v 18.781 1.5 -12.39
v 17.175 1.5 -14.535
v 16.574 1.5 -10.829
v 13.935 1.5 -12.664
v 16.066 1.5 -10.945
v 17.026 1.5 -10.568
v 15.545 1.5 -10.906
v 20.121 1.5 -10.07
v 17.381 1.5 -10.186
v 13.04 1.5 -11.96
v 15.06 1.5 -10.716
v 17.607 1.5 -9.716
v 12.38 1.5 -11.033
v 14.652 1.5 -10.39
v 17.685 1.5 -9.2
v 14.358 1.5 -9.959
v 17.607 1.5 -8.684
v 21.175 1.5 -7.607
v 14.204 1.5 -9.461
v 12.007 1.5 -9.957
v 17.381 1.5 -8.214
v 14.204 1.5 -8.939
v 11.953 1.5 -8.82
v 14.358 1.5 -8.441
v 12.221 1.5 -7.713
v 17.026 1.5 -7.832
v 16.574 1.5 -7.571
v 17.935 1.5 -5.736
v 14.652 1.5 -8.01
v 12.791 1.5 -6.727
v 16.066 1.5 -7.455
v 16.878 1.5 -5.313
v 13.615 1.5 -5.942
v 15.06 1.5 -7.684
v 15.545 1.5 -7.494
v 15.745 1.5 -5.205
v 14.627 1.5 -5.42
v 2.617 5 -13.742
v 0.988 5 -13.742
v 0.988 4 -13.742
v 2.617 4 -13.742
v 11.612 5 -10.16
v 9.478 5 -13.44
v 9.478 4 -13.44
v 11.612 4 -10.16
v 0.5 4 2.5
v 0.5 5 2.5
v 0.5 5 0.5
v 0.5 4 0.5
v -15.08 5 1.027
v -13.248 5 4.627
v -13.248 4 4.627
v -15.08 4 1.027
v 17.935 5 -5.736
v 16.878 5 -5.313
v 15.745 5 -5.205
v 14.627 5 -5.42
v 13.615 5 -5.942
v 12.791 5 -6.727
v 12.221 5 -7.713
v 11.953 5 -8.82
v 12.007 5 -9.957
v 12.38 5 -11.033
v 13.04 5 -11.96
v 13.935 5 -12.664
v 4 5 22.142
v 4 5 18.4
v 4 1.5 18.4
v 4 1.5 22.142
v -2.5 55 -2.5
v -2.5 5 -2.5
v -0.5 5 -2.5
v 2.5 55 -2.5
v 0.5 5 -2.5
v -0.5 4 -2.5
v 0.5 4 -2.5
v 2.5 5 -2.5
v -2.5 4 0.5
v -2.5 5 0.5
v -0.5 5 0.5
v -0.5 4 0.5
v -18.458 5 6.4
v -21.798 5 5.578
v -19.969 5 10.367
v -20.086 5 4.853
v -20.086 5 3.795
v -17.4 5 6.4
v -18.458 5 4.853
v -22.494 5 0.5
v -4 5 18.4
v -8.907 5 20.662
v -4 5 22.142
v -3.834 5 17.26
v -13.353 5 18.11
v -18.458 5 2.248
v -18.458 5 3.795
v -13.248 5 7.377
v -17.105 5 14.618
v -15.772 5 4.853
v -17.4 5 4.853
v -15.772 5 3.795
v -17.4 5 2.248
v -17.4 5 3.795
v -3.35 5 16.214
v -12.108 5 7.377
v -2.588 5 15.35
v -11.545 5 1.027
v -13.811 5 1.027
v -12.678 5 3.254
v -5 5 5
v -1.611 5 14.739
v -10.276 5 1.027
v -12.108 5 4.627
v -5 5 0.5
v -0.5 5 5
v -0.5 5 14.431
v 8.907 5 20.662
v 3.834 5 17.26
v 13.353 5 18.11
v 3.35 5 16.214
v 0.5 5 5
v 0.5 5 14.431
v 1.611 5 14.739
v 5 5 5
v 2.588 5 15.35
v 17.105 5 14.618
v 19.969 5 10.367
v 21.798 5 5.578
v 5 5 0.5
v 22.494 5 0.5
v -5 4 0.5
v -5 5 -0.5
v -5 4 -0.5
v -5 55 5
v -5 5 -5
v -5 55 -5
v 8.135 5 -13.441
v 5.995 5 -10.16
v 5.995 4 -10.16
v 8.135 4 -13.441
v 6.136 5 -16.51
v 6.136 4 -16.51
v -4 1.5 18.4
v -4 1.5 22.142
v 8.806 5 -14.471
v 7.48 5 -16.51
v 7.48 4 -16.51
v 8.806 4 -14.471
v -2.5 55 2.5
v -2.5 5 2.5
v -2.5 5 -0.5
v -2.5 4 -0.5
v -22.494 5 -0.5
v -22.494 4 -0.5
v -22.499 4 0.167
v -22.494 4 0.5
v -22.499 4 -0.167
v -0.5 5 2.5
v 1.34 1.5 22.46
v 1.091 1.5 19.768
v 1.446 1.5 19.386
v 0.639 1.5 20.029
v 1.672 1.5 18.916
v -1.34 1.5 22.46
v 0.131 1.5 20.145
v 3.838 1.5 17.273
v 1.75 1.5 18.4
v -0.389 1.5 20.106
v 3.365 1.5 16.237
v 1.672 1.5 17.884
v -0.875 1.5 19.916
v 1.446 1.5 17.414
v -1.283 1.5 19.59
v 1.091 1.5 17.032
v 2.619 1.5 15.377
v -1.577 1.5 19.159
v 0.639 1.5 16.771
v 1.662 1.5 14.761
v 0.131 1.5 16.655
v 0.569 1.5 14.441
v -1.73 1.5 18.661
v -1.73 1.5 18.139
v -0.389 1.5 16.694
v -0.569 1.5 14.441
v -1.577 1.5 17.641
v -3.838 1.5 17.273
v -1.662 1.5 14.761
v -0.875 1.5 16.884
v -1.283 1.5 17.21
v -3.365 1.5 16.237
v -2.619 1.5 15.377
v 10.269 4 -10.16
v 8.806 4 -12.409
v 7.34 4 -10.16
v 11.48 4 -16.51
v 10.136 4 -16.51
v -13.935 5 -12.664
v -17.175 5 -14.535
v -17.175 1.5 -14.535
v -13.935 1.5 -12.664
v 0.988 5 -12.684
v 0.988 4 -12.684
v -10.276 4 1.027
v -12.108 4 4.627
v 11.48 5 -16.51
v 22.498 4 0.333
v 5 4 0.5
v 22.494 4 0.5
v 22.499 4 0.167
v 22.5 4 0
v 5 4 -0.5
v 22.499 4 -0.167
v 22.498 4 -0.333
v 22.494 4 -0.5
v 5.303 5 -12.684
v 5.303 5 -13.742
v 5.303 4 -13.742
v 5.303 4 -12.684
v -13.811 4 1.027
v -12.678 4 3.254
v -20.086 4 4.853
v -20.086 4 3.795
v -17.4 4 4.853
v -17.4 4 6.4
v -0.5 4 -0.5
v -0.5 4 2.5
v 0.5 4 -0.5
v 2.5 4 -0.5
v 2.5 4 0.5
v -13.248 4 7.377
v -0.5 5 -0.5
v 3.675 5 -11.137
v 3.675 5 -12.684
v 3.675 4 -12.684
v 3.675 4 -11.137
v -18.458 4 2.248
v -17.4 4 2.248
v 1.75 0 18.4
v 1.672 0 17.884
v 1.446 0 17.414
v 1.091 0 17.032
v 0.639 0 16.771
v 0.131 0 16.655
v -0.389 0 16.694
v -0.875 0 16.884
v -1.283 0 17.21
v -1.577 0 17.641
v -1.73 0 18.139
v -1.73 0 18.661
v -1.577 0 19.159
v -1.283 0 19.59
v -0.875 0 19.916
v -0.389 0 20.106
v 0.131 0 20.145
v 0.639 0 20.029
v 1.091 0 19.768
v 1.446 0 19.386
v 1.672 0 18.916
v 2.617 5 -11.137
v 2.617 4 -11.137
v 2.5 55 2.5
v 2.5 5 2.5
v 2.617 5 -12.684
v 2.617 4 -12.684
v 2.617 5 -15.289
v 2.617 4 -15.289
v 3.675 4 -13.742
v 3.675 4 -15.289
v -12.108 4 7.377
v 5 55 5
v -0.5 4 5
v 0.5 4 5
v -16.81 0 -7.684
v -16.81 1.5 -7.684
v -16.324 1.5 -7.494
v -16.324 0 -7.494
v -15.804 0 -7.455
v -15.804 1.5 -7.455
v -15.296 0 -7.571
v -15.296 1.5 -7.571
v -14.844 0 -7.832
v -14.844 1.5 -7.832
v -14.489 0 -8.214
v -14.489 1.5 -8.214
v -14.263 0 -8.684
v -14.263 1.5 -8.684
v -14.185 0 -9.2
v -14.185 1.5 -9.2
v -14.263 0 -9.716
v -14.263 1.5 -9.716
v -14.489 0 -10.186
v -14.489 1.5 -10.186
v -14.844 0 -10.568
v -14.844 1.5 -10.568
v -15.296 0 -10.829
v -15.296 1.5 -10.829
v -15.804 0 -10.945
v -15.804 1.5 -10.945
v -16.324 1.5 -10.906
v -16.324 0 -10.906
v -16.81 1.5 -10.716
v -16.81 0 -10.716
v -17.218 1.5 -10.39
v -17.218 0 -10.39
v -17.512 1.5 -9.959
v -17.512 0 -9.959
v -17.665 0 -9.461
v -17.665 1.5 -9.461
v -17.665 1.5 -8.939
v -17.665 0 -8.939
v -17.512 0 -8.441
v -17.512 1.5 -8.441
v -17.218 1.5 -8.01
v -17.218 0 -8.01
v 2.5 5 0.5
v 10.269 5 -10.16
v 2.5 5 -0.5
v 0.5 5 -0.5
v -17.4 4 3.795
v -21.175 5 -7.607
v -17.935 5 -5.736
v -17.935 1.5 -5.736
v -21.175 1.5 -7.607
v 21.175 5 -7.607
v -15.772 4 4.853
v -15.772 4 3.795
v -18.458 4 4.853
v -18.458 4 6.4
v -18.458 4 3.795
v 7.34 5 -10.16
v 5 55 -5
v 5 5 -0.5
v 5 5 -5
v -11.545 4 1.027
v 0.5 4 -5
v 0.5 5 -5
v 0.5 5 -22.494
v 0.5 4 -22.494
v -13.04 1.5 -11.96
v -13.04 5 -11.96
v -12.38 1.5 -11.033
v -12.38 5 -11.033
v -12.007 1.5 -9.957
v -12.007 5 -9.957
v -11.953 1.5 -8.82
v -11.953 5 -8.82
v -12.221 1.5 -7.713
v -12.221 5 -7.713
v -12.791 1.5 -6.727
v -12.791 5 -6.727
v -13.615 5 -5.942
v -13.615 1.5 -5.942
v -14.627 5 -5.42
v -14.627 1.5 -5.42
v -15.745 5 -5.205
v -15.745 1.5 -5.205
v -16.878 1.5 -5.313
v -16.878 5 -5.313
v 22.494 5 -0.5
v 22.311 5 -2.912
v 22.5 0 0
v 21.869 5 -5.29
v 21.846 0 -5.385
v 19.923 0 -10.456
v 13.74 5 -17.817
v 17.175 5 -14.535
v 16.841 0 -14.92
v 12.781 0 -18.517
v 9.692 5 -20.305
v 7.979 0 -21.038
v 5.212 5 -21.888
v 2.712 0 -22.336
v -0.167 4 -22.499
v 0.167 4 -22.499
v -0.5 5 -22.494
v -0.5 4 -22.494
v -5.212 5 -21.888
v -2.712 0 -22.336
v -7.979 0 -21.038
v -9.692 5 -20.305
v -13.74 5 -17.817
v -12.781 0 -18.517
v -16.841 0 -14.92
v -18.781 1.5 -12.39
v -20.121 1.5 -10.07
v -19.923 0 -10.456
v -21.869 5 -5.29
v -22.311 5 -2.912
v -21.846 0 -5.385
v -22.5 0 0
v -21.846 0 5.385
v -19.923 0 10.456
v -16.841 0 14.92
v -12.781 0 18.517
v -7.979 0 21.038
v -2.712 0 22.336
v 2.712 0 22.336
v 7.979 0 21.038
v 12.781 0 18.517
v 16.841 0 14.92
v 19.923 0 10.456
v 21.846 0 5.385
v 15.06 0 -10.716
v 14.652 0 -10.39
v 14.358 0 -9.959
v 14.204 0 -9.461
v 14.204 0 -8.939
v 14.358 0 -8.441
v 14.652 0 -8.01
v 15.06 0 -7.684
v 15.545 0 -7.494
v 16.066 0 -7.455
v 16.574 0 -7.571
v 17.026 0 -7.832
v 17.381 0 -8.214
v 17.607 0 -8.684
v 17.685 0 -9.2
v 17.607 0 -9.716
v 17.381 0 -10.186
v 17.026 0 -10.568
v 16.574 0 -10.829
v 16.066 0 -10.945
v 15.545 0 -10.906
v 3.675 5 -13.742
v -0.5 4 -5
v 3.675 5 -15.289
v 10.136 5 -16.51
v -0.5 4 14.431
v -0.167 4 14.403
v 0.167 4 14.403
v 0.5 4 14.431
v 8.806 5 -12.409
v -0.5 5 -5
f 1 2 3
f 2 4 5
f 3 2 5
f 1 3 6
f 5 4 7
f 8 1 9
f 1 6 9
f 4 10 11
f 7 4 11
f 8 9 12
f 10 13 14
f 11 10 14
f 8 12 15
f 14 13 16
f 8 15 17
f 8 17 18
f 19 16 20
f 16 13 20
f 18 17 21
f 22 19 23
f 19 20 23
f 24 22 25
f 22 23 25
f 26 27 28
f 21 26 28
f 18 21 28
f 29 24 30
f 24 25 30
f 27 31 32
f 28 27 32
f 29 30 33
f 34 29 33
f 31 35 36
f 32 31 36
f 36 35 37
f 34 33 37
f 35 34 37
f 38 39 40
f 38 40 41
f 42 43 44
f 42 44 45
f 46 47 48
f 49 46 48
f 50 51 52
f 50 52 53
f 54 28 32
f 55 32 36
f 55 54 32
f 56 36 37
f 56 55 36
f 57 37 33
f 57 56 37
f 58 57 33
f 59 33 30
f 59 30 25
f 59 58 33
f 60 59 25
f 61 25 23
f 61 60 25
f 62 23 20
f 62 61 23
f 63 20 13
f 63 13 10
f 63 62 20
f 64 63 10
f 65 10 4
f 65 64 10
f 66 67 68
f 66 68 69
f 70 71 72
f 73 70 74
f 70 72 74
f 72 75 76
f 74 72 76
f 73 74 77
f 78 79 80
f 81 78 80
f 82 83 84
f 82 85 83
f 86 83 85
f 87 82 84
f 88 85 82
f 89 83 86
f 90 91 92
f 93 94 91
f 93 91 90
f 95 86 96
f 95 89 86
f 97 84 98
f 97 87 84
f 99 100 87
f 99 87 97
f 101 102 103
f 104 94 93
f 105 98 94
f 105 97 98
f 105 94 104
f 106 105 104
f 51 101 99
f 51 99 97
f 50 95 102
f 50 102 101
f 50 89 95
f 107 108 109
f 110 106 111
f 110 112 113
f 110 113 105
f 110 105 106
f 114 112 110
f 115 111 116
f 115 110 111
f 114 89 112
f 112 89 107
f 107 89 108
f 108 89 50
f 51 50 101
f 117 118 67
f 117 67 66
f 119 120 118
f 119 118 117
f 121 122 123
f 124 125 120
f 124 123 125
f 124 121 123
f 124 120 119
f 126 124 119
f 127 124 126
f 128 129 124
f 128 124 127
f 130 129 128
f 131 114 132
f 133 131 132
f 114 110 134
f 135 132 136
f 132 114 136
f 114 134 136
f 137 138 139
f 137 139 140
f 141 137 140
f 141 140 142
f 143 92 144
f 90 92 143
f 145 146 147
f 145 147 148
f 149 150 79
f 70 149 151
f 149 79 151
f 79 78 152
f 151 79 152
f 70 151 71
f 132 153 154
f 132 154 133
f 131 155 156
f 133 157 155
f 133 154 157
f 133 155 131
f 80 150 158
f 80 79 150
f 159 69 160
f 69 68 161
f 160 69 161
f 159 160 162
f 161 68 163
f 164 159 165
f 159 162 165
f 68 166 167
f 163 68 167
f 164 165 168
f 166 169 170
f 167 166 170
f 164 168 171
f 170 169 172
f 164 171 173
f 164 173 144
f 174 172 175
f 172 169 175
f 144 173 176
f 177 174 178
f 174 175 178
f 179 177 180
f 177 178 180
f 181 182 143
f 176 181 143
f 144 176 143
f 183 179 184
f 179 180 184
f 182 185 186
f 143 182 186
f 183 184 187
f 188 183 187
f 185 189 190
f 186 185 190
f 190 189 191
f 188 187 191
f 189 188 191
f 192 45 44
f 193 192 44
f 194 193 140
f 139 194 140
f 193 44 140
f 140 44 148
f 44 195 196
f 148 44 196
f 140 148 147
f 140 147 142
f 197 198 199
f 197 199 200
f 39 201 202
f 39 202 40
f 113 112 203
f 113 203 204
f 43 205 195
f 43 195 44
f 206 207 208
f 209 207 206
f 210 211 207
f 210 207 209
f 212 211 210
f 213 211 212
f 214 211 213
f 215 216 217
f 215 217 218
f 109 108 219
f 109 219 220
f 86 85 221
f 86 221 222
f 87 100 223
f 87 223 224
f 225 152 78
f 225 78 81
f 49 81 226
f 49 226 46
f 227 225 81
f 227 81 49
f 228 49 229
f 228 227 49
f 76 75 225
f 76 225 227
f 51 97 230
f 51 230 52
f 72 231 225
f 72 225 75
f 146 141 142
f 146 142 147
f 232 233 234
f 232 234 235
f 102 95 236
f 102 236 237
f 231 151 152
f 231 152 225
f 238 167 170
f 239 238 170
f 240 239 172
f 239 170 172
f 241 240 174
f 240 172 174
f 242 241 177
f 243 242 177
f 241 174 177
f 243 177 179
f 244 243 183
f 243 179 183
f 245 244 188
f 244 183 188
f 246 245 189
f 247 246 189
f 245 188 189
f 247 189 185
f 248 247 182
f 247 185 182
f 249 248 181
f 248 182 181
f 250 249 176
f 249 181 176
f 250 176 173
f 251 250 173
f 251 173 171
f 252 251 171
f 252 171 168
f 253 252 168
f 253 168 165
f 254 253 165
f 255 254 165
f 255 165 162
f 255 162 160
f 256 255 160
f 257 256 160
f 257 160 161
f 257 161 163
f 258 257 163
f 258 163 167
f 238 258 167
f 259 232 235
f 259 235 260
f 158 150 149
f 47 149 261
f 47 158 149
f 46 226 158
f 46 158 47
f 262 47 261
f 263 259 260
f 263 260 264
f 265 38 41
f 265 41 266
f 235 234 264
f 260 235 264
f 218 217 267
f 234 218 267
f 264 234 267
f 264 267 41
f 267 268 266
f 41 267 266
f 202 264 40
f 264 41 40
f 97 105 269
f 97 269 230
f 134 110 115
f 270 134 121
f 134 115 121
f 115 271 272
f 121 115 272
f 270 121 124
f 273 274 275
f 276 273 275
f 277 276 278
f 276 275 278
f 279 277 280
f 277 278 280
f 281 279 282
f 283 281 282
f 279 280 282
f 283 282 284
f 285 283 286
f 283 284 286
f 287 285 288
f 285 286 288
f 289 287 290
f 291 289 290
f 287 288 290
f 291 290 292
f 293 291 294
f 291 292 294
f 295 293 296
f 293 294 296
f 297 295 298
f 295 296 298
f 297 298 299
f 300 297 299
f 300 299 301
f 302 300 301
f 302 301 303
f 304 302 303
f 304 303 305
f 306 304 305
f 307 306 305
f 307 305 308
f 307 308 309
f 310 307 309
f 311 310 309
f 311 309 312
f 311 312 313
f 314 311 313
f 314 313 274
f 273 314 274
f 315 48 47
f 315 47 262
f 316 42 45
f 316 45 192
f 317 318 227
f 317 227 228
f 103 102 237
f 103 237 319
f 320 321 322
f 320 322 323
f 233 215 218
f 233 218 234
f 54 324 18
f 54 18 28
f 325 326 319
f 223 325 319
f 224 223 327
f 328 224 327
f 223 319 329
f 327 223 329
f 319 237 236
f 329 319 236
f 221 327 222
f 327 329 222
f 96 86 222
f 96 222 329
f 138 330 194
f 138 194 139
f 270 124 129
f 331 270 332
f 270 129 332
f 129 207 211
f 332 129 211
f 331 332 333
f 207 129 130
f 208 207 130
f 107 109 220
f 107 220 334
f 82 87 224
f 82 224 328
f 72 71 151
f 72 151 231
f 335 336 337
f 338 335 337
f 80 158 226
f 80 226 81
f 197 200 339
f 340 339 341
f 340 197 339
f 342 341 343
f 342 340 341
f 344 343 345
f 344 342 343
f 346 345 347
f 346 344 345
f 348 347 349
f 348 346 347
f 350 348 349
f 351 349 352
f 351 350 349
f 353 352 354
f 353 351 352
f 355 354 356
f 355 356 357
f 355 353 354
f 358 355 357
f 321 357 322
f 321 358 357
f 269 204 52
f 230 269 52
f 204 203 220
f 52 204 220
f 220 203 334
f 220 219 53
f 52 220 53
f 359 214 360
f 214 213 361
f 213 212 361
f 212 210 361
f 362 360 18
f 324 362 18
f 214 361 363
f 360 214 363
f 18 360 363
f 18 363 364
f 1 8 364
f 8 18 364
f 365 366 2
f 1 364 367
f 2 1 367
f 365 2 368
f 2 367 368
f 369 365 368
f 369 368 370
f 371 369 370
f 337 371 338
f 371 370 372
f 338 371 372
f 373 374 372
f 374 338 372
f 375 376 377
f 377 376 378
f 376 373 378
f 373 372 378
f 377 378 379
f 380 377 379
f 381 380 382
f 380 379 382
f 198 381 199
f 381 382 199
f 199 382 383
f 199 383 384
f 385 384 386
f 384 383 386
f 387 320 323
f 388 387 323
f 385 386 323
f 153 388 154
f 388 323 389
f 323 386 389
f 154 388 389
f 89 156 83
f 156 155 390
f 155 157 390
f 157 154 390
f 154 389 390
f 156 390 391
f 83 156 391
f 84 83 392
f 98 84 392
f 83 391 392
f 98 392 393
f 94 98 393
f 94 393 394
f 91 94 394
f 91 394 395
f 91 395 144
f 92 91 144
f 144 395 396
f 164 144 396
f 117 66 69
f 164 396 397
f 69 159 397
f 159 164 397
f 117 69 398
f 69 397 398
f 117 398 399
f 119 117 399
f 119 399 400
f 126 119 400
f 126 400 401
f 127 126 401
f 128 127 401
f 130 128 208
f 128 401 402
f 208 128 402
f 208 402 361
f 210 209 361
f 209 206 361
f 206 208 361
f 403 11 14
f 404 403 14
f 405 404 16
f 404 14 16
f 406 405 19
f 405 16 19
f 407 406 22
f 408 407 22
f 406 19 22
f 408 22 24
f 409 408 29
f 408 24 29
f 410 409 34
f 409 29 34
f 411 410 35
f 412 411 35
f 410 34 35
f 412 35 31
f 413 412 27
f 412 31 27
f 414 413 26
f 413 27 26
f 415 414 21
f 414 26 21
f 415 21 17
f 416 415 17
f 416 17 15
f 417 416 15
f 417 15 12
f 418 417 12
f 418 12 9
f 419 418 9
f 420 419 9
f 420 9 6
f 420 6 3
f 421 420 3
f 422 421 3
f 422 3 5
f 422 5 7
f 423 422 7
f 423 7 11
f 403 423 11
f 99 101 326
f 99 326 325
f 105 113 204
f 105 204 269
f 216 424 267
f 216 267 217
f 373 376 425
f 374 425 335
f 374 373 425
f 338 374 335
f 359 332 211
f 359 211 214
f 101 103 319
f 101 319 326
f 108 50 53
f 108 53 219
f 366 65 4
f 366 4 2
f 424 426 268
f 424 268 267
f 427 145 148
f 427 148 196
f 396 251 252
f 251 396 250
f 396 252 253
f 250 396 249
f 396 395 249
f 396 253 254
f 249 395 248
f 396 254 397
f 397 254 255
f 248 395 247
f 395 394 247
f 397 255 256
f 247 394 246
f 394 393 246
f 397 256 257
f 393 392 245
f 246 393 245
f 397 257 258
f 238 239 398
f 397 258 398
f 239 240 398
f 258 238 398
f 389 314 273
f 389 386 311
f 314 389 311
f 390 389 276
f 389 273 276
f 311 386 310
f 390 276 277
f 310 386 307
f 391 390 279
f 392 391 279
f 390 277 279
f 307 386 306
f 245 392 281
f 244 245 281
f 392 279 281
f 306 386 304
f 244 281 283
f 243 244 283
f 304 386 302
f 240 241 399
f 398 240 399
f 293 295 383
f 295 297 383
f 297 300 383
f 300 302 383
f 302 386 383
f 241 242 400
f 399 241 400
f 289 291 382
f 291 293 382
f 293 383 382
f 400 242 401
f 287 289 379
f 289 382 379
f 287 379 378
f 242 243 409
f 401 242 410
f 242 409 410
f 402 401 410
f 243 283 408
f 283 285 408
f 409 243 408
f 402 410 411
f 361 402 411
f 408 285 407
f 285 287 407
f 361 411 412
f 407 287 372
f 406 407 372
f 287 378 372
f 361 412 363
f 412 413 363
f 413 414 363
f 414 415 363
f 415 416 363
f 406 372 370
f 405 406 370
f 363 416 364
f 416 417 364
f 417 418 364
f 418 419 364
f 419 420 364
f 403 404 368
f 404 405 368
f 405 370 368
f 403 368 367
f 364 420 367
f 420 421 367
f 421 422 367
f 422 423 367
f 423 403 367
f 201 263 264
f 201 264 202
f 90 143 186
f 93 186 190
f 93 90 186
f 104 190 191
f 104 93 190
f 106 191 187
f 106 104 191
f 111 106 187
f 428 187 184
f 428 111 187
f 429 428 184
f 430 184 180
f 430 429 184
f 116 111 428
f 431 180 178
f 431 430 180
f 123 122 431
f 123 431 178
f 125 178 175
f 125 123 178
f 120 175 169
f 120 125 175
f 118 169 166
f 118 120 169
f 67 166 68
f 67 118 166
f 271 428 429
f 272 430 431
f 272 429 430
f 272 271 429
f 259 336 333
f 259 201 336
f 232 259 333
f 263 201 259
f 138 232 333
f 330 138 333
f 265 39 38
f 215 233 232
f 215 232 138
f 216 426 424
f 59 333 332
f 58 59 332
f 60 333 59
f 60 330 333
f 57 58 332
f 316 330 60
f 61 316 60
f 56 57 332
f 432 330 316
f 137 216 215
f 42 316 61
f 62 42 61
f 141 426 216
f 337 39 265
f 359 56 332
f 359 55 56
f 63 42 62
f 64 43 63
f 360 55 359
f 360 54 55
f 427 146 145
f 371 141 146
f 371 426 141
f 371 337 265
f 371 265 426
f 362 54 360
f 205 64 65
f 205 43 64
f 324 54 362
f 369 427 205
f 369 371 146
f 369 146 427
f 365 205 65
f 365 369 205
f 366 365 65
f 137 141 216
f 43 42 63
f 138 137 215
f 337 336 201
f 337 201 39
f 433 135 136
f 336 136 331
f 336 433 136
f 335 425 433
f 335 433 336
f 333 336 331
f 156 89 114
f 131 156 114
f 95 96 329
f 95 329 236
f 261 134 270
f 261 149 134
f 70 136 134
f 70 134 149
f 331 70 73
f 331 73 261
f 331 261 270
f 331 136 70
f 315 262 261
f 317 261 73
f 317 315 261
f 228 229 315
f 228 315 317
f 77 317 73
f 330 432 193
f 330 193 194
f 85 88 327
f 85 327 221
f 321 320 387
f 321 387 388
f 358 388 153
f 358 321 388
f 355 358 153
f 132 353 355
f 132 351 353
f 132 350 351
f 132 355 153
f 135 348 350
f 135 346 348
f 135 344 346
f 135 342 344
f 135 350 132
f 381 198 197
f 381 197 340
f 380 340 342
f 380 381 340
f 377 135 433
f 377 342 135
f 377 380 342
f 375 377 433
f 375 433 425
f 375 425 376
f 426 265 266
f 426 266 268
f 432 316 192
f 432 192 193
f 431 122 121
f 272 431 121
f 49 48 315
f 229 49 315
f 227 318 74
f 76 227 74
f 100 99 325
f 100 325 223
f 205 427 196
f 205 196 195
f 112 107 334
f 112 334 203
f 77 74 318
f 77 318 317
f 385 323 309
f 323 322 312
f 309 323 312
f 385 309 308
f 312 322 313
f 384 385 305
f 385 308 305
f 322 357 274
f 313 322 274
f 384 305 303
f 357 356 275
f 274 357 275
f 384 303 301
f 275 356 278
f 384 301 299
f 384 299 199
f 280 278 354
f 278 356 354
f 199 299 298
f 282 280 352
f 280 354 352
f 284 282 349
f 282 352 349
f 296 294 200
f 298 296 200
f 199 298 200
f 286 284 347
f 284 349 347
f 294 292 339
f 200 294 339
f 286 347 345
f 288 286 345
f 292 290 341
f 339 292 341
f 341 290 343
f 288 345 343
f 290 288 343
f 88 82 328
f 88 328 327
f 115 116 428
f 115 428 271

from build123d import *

# Parameters (mm, degrees)
SKETCH1_R                     = 22.5
PLATE_DEPTH                   = 5
OPENING_START                 = 1.5
OPENING_FOR_SCREW_DEPTH       = 5
SKETCH7_R                     = 1.75
SCREW_HOLE_DEPTH              = 5
CIRPATTERN20_COUNT            = 3
SKETCH10_W                    = 45
SKETCH10_H                    = 1
SKETCH10_W_2                  = 1
SKETCH10_H_2                  = 45
CUT_EXTRUDE5_DEPTH            = 1
CUT_EXTRUDE6_DEPTH            = 1
SKETCH12_W                    = 10
SKETCH12_H                    = 10
SKETCH12_W_2                  = 5
SKETCH12_H_2                  = 5
TOOL_CONNECT_PIECE_DEPTH      = 50
TOOL_CONNECT_PIECE_DEPTH_BACK = 1


with BuildPart() as part:
    # Sketch1 → plate (new body)
    with BuildSketch(Plane(origin=(0, 0, 0), x_dir=(1, 0, 0), z_dir=(0, 1, 0))):
        Circle(SKETCH1_R)
    extrude(amount=PLATE_DEPTH)

    # Sketch6 → opening for screw (cut)
    with BuildSketch(Plane(origin=(0, 5, 0), x_dir=(1, 0, 0), z_dir=(0, 1, 0)).offset(OPENING_START)):
        with BuildLine():
            Line((-4, -22.5), (-4, -18.4))
            ThreePointArc((-4, -18.4), (0, -14.4), (4, -18.4))
            Line((4, -18.4), (4, -22.5))
            ThreePointArc((4, -22.5), (0, -26.5), (-4, -22.5))
        make_face()
    opening_for_screw = extrude(amount=-OPENING_FOR_SCREW_DEPTH, mode=Mode.SUBTRACT)

    # Sketch7 → screw hole (cut)
    with BuildSketch(Plane(origin=(0, 1.5, 0), x_dir=(1, 0, 0), z_dir=(0, 1, 0))):
        with Locations((0, -18.4)):
            Circle(SKETCH7_R)
    screw_hole = extrude(amount=-SCREW_HOLE_DEPTH, mode=Mode.SUBTRACT)

    # CirPattern20: opening for screw, screw hole ×3 about axis
    cirpattern20_axis = Axis((0, 0, 0), (0, 1, 0))
    for i in range(1, CIRPATTERN20_COUNT):
        add(opening_for_screw.rotate(cirpattern20_axis, i * 360 / CIRPATTERN20_COUNT), mode=Mode.SUBTRACT)
        add(screw_hole.rotate(cirpattern20_axis, i * 360 / CIRPATTERN20_COUNT), mode=Mode.SUBTRACT)

    # Sketch10 → Cut-Extrude5 (cut)
    with BuildSketch(Plane(origin=(0, 5, 0), x_dir=(1, 0, 0), z_dir=(0, 1, 0))):
        Rectangle(SKETCH10_W, SKETCH10_H)
        Rectangle(SKETCH10_W_2, SKETCH10_H_2)
    extrude(amount=-CUT_EXTRUDE5_DEPTH, mode=Mode.SUBTRACT)

    # Sketch11 → Cut-Extrude6 (cut)
    with BuildSketch(Plane(origin=(0, 5, 0), x_dir=(1, 0, 0), z_dir=(0, 1, 0))):
        Polygon((2.616666667, 13.742425761), (2.616666667, 15.289220632), (3.675, 15.289220632), (3.675, 13.742425761), (5.303205128, 13.742425761), (5.303205128, 12.684092427), (3.675, 12.684092427), (3.675, 11.137297556), (2.616666667, 11.137297556), (2.616666667, 12.684092427), (0.988461538, 12.684092427), (0.988461538, 13.742425761), align=None)
        Polygon((6.136388221, 16.510374479), (7.479657452, 16.510374479), (8.806390224, 14.471301963), (10.135667067, 16.510374479), (11.480208333, 16.510374479), (9.47802484, 13.43968137), (11.6125, 10.160374479), (10.269230769, 10.160374479), (8.806390224, 12.409332812), (7.339733574, 10.160374479), (5.995192308, 10.160374479), (8.134755609, 13.440953405), align=None)
        Polygon((-18.458103671, -3.794817635), (-18.458103671, -2.248022763), (-17.399770338, -2.248022763), (-17.399770338, -3.794817635), (-15.771565209, -3.794817635), (-15.771565209, -4.853150968), (-17.399770338, -4.853150968), (-17.399770338, -6.39994584), (-18.458103671, -6.39994584), (-18.458103671, -4.853150968), (-20.086308799, -4.853150968), (-20.086308799, -3.794817635), align=None)
        Polygon((-15.07957803, -1.026868917), (-13.811358879, -1.026868917), (-12.677975466, -3.254202651), (-11.544592052, -1.026868917), (-10.276372902, -1.026868917), (-12.108103671, -4.626728693), (-12.108103671, -7.376868917), (-13.247847261, -7.376868917), (-13.247847261, -4.626728693), align=None)
    extrude(amount=-CUT_EXTRUDE6_DEPTH, mode=Mode.SUBTRACT)

    # Sketch12 → tool connect piece (add, two sides)
    with BuildSketch(Plane(origin=(0, 5, 0), x_dir=(1, 0, 0), z_dir=(0, 1, 0))) as tool_connect_piece_sk:
        Rectangle(SKETCH12_W, SKETCH12_H)
        Rectangle(SKETCH12_W_2, SKETCH12_H_2, mode=Mode.SUBTRACT)
    extrude(amount=TOOL_CONNECT_PIECE_DEPTH)
    extrude(tool_connect_piece_sk.sketch, amount=-TOOL_CONNECT_PIECE_DEPTH_BACK)


solid = part.part
